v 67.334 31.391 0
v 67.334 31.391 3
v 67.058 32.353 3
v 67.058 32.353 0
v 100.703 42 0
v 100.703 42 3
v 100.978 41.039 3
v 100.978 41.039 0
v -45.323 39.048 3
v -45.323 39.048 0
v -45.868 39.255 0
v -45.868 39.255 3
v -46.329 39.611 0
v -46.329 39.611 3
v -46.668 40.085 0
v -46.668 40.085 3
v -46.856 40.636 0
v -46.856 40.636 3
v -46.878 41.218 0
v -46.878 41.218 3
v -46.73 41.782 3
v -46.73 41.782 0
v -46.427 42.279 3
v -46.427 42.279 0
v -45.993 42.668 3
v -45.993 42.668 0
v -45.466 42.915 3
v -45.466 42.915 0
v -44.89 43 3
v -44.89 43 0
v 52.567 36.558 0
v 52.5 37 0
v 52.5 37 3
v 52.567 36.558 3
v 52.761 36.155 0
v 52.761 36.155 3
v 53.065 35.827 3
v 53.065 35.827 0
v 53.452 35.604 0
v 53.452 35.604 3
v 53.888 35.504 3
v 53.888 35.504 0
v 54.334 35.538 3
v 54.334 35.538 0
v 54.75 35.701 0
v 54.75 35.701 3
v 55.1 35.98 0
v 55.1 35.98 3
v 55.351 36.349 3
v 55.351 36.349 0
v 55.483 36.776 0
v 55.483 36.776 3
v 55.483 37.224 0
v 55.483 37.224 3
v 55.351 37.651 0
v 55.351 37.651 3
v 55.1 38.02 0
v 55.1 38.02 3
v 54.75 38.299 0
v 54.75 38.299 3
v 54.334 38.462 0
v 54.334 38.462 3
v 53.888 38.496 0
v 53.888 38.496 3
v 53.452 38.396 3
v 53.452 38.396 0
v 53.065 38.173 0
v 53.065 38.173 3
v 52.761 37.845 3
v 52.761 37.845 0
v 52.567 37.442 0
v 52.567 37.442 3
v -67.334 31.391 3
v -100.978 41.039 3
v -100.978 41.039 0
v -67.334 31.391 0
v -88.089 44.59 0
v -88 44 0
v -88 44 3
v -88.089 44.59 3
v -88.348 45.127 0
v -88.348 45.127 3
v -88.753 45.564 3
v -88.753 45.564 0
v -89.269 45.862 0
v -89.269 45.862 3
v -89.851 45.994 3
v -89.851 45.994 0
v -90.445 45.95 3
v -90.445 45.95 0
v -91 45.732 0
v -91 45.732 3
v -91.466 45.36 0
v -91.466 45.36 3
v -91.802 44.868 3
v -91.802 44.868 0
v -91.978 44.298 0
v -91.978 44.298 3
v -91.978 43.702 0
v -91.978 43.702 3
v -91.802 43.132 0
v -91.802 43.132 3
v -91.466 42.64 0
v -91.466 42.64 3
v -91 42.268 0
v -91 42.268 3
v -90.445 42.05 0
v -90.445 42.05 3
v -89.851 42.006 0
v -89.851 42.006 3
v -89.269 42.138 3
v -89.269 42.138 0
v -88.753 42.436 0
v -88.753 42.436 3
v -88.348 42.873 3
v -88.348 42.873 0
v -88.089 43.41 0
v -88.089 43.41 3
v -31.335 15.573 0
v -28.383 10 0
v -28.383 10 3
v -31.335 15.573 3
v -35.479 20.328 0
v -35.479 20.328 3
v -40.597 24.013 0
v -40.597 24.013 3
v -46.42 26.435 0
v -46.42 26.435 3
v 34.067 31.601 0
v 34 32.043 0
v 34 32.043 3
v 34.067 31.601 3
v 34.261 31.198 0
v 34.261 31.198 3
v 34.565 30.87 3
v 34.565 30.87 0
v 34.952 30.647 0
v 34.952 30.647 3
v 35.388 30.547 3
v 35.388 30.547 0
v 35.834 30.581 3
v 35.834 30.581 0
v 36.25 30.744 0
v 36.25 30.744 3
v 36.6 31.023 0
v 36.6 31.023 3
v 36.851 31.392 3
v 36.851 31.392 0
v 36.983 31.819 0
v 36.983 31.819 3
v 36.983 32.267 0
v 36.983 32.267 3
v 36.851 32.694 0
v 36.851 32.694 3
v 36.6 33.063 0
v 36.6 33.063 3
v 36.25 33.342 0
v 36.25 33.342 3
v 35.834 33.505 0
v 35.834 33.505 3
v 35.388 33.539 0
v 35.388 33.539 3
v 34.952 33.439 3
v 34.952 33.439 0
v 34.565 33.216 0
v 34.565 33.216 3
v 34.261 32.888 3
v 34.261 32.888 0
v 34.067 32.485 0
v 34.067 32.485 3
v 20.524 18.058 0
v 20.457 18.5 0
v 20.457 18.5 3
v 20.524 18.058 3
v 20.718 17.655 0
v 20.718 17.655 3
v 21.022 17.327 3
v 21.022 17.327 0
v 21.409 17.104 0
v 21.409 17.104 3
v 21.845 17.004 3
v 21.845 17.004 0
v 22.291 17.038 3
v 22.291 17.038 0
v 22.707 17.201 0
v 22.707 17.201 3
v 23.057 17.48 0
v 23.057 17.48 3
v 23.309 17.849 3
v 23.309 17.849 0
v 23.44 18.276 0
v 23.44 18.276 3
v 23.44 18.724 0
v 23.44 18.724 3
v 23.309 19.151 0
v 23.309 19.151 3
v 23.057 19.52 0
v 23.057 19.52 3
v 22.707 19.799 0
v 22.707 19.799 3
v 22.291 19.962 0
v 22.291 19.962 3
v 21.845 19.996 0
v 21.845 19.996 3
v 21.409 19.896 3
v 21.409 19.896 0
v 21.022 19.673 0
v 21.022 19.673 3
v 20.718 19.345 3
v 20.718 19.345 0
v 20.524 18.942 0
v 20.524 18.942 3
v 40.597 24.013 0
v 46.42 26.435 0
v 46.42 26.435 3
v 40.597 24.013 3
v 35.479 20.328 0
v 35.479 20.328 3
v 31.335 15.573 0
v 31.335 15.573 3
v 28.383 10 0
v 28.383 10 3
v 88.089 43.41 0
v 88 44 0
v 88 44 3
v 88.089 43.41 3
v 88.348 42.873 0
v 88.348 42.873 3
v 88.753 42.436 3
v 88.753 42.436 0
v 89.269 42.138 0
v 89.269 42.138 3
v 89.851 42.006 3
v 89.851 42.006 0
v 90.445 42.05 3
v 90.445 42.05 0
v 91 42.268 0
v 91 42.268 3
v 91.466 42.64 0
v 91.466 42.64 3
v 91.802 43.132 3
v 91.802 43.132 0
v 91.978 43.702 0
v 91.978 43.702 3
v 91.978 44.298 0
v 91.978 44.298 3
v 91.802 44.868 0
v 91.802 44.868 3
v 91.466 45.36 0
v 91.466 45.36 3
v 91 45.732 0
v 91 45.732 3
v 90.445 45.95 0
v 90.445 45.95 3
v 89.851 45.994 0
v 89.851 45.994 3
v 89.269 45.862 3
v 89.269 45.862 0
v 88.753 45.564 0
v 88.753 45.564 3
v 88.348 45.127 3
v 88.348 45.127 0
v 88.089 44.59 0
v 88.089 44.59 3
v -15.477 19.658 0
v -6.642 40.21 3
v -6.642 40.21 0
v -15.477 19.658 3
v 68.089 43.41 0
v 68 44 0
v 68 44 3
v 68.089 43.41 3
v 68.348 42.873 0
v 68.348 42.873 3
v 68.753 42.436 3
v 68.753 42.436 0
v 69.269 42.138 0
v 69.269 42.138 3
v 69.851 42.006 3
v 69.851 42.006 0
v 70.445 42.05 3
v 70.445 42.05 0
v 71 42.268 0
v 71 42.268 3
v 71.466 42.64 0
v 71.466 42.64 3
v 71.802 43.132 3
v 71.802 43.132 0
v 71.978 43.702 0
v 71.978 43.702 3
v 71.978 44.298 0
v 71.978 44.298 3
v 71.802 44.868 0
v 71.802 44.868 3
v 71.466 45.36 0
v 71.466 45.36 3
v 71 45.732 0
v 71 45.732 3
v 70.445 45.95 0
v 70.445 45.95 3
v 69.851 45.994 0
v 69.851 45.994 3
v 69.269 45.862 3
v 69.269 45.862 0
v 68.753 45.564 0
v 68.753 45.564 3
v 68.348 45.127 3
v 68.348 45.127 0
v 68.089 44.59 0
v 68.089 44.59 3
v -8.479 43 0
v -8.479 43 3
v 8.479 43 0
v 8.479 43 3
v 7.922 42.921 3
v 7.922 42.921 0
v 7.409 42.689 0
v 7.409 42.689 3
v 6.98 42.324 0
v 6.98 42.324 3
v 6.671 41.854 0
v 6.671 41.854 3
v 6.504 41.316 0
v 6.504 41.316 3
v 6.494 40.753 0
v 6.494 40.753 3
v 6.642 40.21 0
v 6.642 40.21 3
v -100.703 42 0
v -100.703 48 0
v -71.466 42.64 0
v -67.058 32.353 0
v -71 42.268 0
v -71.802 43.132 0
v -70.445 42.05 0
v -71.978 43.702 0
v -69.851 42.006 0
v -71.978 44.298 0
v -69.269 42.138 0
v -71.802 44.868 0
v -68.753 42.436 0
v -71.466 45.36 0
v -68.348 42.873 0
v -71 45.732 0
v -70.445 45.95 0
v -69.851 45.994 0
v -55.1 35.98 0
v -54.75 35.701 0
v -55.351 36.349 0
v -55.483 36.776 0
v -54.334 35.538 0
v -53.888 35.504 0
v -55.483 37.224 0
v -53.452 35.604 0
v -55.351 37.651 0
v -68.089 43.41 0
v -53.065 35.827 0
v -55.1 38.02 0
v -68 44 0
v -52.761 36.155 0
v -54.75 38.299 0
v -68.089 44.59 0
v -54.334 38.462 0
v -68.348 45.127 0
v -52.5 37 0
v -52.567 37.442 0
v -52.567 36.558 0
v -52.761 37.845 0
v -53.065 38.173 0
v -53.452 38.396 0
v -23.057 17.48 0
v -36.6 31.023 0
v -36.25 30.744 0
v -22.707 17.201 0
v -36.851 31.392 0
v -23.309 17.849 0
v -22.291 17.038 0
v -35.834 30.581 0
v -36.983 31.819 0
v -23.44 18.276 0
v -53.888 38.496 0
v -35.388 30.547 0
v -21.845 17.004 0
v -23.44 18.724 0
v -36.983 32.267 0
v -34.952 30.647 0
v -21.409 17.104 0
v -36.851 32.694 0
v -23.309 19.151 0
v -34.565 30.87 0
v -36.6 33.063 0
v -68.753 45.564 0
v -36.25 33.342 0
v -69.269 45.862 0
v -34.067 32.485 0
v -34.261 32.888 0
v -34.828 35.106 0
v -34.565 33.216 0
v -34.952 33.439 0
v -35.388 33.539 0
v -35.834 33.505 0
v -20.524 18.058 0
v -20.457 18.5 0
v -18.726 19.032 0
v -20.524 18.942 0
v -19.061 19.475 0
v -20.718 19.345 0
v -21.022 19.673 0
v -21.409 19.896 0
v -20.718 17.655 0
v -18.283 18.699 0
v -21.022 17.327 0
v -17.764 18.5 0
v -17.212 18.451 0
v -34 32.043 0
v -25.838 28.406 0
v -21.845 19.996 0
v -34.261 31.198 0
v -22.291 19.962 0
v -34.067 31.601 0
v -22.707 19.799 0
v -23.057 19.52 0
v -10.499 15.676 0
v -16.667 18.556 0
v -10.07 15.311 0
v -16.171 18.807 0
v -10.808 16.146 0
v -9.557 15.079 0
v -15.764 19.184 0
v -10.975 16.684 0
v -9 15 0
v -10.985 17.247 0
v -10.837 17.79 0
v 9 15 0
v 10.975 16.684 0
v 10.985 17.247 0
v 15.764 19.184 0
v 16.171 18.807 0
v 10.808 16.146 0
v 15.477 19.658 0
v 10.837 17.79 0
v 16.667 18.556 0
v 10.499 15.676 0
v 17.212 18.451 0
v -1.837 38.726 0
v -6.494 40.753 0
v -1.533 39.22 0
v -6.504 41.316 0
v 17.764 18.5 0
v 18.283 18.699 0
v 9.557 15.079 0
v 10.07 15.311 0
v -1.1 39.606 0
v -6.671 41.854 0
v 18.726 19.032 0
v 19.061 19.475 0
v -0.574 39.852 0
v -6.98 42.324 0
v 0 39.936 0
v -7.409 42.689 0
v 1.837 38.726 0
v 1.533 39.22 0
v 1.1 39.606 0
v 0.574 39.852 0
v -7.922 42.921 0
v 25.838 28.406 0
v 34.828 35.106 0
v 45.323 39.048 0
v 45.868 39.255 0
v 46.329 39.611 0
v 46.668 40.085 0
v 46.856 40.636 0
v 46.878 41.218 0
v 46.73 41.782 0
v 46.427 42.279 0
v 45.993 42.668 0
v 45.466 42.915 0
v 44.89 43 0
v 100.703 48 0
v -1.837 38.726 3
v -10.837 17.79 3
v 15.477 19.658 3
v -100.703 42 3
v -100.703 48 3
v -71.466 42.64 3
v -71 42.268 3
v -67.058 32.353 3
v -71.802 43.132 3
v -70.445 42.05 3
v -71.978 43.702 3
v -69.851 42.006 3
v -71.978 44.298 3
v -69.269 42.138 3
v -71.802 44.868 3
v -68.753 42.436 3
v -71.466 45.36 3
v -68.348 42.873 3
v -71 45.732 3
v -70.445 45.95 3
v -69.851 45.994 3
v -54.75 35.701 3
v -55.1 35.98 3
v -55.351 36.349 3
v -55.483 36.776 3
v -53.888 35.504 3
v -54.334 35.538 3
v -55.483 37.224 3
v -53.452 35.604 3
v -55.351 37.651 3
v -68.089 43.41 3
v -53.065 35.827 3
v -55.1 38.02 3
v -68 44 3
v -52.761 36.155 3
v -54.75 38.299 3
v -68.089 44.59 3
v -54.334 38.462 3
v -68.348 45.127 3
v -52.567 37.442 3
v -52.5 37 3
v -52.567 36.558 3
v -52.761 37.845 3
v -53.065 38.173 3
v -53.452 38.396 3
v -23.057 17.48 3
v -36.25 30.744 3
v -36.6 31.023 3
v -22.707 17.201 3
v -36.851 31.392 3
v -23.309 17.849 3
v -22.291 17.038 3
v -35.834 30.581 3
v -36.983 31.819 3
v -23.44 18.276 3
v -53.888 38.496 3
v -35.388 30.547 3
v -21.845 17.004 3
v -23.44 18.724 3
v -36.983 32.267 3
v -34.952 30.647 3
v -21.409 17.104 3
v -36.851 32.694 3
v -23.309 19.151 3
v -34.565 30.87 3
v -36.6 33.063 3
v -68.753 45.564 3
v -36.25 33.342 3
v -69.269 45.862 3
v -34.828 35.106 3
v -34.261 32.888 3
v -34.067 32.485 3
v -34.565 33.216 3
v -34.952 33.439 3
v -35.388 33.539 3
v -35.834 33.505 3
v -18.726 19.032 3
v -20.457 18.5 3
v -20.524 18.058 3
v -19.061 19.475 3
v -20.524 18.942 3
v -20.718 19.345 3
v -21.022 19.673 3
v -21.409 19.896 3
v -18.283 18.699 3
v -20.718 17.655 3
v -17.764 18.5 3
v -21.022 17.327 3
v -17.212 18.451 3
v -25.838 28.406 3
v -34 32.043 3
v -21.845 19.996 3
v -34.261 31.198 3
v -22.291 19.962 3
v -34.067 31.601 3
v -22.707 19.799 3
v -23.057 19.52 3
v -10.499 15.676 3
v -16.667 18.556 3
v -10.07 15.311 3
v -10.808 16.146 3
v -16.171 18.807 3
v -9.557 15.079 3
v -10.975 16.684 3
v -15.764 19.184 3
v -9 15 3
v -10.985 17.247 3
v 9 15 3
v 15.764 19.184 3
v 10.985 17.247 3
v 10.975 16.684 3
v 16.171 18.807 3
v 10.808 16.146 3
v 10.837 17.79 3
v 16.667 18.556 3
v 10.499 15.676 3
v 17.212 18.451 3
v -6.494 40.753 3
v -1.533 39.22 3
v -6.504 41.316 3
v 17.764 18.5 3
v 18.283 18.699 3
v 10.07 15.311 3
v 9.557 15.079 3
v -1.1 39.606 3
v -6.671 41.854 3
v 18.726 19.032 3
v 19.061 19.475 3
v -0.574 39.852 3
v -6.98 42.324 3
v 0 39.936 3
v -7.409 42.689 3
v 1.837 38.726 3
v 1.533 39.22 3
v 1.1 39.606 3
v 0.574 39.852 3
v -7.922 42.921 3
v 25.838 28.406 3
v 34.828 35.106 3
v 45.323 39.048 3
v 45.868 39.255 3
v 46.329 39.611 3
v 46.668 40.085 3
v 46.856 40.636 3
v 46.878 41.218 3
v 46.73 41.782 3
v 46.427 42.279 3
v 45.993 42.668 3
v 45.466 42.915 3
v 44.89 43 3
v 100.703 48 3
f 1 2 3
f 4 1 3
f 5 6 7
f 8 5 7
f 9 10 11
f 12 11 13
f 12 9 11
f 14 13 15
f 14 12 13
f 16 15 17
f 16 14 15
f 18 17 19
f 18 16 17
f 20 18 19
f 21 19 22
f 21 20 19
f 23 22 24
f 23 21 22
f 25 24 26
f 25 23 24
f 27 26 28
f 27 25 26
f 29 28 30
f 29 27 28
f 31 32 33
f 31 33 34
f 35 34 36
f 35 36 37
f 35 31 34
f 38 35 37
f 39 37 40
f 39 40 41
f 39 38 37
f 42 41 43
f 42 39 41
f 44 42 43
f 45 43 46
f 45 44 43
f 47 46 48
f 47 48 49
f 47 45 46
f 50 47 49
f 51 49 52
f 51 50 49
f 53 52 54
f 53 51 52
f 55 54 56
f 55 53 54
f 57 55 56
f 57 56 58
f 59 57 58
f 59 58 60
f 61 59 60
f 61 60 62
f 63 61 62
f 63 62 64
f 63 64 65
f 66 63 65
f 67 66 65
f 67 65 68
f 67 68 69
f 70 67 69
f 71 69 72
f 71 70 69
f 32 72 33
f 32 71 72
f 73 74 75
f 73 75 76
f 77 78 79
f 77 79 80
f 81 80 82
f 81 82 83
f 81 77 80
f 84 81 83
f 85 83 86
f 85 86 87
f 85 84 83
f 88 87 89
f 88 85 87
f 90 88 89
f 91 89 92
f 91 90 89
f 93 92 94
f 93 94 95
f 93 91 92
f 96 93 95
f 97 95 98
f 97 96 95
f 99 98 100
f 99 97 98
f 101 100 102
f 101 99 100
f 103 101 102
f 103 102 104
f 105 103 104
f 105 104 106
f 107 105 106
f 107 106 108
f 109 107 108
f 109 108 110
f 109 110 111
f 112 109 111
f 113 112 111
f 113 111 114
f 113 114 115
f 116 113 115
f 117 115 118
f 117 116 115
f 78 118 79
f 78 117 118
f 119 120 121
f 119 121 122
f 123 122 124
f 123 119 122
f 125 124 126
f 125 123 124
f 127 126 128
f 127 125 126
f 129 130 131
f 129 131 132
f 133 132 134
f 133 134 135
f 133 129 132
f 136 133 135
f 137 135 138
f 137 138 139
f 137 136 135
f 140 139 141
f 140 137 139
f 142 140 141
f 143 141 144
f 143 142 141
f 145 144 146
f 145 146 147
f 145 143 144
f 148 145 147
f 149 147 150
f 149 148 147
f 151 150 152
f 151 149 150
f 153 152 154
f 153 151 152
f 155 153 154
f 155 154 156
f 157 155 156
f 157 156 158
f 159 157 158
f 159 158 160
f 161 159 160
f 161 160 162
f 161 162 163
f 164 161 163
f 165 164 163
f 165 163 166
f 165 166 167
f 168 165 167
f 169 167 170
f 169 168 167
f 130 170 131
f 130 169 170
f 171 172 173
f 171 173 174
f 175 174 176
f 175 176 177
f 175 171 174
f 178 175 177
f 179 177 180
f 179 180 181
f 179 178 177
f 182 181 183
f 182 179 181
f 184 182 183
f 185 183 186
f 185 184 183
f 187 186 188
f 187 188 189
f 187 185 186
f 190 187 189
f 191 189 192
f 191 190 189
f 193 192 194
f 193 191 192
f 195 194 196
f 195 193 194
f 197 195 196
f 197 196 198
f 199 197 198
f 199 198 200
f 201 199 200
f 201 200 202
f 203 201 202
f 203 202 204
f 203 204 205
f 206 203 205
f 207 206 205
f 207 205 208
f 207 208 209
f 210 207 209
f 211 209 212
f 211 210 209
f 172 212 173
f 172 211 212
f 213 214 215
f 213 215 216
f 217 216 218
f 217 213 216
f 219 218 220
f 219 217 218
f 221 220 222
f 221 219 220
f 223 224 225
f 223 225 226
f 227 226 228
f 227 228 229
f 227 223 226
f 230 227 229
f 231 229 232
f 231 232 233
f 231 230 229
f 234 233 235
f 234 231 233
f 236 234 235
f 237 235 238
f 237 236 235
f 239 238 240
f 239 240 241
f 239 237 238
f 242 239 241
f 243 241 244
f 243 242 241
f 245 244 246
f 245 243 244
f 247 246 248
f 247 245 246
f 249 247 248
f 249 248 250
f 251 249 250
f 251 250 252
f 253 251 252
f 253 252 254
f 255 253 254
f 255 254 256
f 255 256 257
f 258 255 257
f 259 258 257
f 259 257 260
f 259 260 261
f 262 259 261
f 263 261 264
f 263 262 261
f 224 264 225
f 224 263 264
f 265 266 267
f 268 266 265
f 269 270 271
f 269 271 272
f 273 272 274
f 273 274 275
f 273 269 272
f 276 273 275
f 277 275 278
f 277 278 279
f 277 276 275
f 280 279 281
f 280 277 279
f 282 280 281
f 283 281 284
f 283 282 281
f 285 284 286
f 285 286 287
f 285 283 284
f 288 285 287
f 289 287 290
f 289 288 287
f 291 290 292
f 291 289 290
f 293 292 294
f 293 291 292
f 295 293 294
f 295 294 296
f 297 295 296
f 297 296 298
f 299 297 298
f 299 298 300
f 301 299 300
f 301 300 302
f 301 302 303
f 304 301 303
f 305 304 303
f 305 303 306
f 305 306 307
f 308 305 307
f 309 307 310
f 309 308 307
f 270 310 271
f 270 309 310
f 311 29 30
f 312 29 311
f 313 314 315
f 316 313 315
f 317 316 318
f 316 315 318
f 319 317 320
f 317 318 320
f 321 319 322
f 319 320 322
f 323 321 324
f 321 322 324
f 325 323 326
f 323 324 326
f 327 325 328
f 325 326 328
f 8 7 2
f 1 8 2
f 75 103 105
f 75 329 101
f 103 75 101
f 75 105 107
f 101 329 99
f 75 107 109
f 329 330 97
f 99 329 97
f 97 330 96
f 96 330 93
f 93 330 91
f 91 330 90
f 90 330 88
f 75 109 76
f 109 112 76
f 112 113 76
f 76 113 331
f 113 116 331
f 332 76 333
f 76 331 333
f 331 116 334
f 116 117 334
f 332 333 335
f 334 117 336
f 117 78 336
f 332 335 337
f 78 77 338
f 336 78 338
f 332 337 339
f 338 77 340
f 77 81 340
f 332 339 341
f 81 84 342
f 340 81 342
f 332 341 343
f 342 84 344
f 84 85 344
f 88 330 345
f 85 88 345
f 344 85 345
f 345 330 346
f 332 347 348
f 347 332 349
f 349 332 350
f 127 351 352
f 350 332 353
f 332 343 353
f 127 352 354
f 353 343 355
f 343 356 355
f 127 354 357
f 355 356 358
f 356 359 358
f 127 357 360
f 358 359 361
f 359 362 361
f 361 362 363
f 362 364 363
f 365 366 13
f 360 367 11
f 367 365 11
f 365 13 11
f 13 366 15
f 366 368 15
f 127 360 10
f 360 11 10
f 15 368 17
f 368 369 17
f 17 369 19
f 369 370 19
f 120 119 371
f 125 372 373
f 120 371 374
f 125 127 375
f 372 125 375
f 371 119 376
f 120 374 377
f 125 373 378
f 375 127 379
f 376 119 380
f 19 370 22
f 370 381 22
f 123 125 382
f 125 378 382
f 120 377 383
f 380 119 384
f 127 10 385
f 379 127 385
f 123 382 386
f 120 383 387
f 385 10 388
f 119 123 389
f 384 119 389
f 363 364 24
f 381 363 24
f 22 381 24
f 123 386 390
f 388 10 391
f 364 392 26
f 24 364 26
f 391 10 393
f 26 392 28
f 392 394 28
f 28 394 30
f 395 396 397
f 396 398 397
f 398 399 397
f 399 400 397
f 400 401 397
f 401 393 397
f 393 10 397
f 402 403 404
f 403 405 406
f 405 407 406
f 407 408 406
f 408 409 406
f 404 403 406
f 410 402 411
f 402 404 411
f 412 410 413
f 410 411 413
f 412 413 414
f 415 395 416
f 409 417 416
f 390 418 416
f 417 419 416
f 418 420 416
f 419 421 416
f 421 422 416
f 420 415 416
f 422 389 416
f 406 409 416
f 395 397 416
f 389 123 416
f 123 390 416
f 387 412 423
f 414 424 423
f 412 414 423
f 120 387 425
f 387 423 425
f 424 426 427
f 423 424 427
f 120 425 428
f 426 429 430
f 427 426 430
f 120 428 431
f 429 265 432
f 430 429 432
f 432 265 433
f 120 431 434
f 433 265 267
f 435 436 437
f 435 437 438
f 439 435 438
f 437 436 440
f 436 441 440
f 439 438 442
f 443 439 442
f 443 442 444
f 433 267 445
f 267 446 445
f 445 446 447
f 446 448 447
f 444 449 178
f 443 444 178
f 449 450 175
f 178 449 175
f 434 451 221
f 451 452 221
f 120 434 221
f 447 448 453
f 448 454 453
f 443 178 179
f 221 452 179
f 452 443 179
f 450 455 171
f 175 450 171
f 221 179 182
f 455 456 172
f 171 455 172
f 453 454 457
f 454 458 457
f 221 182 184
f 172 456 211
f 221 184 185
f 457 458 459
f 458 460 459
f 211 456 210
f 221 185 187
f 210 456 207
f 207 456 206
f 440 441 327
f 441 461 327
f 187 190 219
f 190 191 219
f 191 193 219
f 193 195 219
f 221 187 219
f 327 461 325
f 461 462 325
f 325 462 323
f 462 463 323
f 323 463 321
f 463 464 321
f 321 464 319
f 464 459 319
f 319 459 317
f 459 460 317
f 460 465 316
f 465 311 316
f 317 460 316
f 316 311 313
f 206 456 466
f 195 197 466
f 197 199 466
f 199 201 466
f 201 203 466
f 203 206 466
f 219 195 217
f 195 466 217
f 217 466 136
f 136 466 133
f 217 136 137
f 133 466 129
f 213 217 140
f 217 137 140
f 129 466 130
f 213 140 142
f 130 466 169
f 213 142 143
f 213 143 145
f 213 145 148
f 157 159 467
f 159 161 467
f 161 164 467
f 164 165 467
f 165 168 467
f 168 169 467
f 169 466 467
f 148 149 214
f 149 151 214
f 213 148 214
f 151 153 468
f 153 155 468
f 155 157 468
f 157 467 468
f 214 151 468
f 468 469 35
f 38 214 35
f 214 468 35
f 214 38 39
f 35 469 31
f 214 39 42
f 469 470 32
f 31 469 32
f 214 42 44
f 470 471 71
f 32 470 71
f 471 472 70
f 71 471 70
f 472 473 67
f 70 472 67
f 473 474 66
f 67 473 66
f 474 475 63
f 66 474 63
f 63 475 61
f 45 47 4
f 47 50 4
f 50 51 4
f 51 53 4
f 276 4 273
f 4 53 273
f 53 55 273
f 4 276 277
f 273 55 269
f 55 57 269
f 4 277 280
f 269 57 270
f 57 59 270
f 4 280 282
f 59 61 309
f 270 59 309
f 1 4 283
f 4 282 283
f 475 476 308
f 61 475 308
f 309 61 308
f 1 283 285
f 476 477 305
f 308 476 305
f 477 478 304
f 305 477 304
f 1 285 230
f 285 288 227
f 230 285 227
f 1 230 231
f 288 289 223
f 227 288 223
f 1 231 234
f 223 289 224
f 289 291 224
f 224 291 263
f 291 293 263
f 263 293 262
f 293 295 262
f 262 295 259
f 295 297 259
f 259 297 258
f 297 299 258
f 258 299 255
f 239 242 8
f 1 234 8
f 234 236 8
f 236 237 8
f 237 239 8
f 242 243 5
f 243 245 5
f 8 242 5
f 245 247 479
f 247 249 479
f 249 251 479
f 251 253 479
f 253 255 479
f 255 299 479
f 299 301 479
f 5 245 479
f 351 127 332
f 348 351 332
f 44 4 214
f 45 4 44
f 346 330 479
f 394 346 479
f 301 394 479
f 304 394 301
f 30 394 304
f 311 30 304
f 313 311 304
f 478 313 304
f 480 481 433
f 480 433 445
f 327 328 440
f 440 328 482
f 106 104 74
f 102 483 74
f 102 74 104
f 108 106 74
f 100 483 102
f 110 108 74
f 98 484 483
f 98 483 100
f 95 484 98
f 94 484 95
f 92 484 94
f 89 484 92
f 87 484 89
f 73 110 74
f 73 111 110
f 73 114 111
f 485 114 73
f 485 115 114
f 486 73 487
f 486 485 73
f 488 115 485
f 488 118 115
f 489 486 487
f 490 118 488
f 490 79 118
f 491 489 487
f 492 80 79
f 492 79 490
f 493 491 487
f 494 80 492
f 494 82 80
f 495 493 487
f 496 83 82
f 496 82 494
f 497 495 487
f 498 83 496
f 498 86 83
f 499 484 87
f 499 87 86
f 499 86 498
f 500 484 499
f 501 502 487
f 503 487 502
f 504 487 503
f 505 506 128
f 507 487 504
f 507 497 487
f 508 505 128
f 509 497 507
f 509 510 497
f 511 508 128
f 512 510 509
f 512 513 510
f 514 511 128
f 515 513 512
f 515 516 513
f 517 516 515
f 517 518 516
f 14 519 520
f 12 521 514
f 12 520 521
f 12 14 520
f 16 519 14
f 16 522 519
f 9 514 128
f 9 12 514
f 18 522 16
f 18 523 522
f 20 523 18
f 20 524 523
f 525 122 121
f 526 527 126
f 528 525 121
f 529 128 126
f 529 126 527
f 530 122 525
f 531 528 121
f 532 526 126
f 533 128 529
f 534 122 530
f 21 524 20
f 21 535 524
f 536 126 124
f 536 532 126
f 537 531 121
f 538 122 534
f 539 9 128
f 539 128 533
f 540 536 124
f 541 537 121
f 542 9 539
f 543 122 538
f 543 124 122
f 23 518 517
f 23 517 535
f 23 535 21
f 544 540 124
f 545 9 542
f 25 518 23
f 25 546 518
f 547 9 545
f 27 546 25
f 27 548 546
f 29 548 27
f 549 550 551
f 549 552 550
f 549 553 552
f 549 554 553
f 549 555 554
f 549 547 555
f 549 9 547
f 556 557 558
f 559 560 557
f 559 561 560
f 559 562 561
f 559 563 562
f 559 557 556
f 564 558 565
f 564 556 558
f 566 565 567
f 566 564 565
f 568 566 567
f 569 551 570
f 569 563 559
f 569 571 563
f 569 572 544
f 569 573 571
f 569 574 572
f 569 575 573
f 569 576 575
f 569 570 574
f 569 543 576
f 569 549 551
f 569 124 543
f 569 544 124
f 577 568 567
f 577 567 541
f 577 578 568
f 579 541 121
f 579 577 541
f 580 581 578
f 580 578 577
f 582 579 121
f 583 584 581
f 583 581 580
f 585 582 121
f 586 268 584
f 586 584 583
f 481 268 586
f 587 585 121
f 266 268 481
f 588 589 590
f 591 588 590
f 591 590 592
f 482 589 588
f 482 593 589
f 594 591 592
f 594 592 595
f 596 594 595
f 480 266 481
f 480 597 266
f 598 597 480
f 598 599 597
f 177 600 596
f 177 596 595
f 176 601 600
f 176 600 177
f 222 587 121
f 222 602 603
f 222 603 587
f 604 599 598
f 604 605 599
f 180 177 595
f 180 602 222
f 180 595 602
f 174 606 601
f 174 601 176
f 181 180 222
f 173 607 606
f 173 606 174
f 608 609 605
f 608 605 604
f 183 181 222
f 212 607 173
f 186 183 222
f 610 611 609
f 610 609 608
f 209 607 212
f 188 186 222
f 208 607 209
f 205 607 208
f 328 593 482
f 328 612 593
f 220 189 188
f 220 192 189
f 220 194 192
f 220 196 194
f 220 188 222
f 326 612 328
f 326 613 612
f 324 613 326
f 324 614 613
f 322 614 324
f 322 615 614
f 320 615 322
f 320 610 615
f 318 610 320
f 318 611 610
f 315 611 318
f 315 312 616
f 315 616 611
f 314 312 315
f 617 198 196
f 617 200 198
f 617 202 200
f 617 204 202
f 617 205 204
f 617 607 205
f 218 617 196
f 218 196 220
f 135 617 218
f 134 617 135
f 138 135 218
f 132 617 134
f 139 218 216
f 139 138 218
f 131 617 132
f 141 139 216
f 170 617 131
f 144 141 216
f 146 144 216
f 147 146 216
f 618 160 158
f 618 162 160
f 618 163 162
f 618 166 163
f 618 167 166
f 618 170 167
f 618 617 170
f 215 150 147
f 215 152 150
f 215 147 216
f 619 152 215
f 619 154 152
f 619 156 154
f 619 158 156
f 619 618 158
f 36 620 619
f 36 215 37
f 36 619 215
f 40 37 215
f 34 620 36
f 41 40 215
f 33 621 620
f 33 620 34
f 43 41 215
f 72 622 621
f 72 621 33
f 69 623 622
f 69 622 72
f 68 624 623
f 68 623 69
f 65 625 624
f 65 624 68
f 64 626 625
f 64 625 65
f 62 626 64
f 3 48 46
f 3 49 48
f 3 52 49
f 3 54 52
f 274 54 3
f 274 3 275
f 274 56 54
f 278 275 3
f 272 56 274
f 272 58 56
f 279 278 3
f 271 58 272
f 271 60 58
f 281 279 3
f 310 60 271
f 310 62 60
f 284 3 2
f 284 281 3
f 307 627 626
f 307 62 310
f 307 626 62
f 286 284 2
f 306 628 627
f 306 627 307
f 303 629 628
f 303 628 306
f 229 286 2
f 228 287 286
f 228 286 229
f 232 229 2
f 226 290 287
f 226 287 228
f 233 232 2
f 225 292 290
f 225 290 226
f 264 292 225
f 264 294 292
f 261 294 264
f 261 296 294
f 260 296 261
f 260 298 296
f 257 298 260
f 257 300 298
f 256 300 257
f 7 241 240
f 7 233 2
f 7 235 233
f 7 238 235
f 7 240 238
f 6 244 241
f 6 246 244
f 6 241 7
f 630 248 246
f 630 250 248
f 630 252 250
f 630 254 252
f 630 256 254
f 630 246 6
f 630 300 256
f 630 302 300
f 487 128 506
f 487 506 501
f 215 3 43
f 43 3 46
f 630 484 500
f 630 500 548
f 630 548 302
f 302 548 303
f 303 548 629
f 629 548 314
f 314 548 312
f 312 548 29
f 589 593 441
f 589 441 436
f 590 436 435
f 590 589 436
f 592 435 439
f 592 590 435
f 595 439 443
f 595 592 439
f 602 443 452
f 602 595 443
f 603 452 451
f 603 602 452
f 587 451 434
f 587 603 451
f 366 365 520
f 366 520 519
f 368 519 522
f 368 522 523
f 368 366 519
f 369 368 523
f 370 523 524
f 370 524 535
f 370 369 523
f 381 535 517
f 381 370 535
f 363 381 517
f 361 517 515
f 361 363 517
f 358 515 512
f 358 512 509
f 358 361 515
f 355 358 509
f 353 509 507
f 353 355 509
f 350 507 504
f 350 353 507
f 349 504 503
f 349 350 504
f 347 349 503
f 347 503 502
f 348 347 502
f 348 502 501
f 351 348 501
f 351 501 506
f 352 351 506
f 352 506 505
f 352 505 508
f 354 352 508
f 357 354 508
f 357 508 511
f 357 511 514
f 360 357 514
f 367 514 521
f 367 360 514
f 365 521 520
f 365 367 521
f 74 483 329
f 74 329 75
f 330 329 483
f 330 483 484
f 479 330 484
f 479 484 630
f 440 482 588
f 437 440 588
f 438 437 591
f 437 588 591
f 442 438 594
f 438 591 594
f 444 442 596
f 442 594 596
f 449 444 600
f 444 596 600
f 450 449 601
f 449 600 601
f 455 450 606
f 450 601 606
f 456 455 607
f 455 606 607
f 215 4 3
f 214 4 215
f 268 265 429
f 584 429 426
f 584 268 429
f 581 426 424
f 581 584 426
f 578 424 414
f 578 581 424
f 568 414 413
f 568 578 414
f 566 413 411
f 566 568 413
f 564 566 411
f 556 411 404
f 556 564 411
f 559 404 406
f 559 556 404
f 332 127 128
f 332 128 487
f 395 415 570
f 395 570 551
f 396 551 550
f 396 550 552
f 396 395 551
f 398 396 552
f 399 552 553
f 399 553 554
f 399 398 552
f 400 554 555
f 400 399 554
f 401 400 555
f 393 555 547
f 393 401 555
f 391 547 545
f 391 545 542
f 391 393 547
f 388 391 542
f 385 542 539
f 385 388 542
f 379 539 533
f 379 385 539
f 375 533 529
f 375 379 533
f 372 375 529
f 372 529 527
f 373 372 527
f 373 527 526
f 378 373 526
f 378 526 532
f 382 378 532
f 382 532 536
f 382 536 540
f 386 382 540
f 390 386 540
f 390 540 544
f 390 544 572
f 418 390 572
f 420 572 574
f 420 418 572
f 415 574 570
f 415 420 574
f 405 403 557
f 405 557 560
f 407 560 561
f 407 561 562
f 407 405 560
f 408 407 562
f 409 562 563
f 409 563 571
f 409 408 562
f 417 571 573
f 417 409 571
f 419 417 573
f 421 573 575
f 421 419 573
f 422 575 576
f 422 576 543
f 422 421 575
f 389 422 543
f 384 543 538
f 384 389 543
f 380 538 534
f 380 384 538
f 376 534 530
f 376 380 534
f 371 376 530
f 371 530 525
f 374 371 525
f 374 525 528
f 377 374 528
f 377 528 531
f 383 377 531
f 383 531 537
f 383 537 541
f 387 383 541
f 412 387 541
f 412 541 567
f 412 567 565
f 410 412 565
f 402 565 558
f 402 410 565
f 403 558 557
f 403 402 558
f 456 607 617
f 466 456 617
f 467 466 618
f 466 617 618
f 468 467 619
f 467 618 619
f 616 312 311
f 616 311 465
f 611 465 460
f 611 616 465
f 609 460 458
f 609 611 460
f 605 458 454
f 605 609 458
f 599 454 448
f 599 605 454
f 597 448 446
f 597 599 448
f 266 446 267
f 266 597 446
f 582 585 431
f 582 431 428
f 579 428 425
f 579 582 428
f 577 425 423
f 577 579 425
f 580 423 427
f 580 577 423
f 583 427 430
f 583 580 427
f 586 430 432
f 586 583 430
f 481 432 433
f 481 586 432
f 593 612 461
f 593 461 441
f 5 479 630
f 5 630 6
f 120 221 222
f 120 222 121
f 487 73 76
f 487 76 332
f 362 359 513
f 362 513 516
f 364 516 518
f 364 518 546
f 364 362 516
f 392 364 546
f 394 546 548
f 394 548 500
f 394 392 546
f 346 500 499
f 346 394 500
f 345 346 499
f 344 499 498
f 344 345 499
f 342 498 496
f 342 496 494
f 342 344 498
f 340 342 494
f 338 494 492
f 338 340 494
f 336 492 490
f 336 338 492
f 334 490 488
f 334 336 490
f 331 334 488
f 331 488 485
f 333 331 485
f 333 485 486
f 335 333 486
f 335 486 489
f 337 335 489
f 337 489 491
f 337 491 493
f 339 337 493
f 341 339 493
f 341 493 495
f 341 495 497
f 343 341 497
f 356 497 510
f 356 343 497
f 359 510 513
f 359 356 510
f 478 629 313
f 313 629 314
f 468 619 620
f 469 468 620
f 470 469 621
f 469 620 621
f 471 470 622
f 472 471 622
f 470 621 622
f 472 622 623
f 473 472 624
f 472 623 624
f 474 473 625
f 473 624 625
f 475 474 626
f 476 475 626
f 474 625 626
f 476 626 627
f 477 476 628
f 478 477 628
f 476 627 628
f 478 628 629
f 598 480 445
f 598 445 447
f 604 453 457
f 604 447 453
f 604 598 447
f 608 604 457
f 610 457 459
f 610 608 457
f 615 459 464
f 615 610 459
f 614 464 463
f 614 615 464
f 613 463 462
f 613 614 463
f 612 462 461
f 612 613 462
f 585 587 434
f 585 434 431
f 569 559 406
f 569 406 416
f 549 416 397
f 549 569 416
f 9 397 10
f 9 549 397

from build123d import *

# Parameters (mm, degrees)
SKETCH_1_R          = 1.5
SKETCH_1_R_2        = 2
EXTRUDE_1_DEPTH     = 3
EXTRUDE_2_DEPTH     = 3
CUT_EXTRUDE_1_DEPTH = 112.846375834


with BuildPart() as part:
    # 草图1 → 凸台-拉伸1 (new body)
    with BuildSketch(Plane.XY):
        with BuildLine():
            Line((-46.419972715, 26.434696638), (-100.702636481, 42))
            Line((-100.702636481, 42), (-100.702636481, 48))
            Line((-100.702636481, 48), (100.702636481, 48))
            Line((100.702636481, 48), (100.702636481, 42))
            Line((100.702636481, 42), (46.419972715, 26.434696638))
            ThreePointArc((46.419972715, 26.434696638), (35.478614393, 20.327525063), (28.382623085, 10))
            Line((28.382623085, 10), (-28.382623085, 10))
            ThreePointArc((-28.382623085, 10), (-35.478614393, 20.327525063), (-46.419972715, 26.434696638))
        make_face()
        with Locations((-54, 37)):
            Circle(SKETCH_1_R, mode=Mode.SUBTRACT)
        with Locations((-35.5, 32.04293994)):
            Circle(SKETCH_1_R, mode=Mode.SUBTRACT)
        with Locations((-21.95706006, 18.5)):
            Circle(SKETCH_1_R, mode=Mode.SUBTRACT)
        with Locations(Location((21.95706006, 18.5, 0), (0, 0, 180))):
            Circle(SKETCH_1_R, mode=Mode.SUBTRACT)
        with Locations(Location((35.5, 32.04293994, 0), (0, 0, 180))):
            Circle(SKETCH_1_R, mode=Mode.SUBTRACT)
        with Locations(Location((54, 37, 0), (0, 0, 180))):
            Circle(SKETCH_1_R, mode=Mode.SUBTRACT)
        with Locations((-90, 44)):
            Circle(SKETCH_1_R_2, mode=Mode.SUBTRACT)
        with Locations((-70, 44)):
            Circle(SKETCH_1_R_2, mode=Mode.SUBTRACT)
        with Locations(Location((70, 44, 0), (0, 0, 180))):
            Circle(SKETCH_1_R_2, mode=Mode.SUBTRACT)
        with Locations(Location((90, 44, 0), (0, 0, 180))):
            Circle(SKETCH_1_R_2, mode=Mode.SUBTRACT)
    extrude(amount=EXTRUDE_1_DEPTH)

    # 草图2 → 凸台-拉伸2 (add)
    with BuildSketch(Plane.XY.offset(3)):
        Polygon((-100.702636481, 42), (-100.978273837, 41.038738304), (-67.334114479, 31.39143085), (-67.058477124, 32.352692546), align=None)
        Polygon((67.058477124, 32.352692546), (100.702636481, 42), (100.978273837, 41.038738304), (67.334114479, 31.39143085), align=None)
    extrude(amount=-EXTRUDE_2_DEPTH)

    # 草图3 → 切除-拉伸1 (cut, through all)
    with BuildSketch(Plane.XY.offset(3)):
        with BuildLine():
            Line((-6.641746516, 40.210125207), (-15.476556882, 19.658485028))
            ThreePointArc((-15.476556882, 19.658485028), (-17.211519663, 18.450985714), (-19.06092662, 19.474628401))
            ThreePointArc((-19.06092662, 19.474628401), (-30.09691848, 32.072460053), (-45.323396591, 39.047619048))
            ThreePointArc((-45.323396591, 39.047619048), (-46.877626016, 41.21821789), (-44.889566421, 43))
            Line((-44.889566421, 43), (-8.479162585, 43))
            ThreePointArc((-8.479162585, 43), (-6.808870756, 42.100056911), (-6.641746516, 40.210125207))
        make_face()
        with BuildLine():
            Line((-10.837416069, 17.789874793), (-1.837416069, 38.725781047))
            ThreePointArc((-1.837416069, 38.725781047), (0, 39.935906254), (1.837416069, 38.725781047))
            Line((1.837416069, 38.725781047), (10.837416069, 17.789874793))
            ThreePointArc((10.837416069, 17.789874793), (10.670291829, 15.899943089), (9, 15))
            Line((9, 15), (-9, 15))
            ThreePointArc((-9, 15), (-10.670291829, 15.899943089), (-10.837416069, 17.789874793))
        make_face()
        with BuildLine():
            Line((44.889566421, 43), (8.479162585, 43))
            ThreePointArc((8.479162585, 43), (6.808870756, 42.100056911), (6.641746516, 40.210125207))
            Line((6.641746516, 40.210125207), (15.476556882, 19.658485028))
            ThreePointArc((15.476556882, 19.658485028), (17.211519663, 18.450985714), (19.06092662, 19.474628401))
            ThreePointArc((19.06092662, 19.474628401), (30.09691848, 32.072460053), (45.323396591, 39.047619048))
            ThreePointArc((45.323396591, 39.047619048), (46.877626016, 41.21821789), (44.889566421, 43))
        make_face()
    extrude(amount=-CUT_EXTRUDE_1_DEPTH, mode=Mode.SUBTRACT)


solid = part.part
